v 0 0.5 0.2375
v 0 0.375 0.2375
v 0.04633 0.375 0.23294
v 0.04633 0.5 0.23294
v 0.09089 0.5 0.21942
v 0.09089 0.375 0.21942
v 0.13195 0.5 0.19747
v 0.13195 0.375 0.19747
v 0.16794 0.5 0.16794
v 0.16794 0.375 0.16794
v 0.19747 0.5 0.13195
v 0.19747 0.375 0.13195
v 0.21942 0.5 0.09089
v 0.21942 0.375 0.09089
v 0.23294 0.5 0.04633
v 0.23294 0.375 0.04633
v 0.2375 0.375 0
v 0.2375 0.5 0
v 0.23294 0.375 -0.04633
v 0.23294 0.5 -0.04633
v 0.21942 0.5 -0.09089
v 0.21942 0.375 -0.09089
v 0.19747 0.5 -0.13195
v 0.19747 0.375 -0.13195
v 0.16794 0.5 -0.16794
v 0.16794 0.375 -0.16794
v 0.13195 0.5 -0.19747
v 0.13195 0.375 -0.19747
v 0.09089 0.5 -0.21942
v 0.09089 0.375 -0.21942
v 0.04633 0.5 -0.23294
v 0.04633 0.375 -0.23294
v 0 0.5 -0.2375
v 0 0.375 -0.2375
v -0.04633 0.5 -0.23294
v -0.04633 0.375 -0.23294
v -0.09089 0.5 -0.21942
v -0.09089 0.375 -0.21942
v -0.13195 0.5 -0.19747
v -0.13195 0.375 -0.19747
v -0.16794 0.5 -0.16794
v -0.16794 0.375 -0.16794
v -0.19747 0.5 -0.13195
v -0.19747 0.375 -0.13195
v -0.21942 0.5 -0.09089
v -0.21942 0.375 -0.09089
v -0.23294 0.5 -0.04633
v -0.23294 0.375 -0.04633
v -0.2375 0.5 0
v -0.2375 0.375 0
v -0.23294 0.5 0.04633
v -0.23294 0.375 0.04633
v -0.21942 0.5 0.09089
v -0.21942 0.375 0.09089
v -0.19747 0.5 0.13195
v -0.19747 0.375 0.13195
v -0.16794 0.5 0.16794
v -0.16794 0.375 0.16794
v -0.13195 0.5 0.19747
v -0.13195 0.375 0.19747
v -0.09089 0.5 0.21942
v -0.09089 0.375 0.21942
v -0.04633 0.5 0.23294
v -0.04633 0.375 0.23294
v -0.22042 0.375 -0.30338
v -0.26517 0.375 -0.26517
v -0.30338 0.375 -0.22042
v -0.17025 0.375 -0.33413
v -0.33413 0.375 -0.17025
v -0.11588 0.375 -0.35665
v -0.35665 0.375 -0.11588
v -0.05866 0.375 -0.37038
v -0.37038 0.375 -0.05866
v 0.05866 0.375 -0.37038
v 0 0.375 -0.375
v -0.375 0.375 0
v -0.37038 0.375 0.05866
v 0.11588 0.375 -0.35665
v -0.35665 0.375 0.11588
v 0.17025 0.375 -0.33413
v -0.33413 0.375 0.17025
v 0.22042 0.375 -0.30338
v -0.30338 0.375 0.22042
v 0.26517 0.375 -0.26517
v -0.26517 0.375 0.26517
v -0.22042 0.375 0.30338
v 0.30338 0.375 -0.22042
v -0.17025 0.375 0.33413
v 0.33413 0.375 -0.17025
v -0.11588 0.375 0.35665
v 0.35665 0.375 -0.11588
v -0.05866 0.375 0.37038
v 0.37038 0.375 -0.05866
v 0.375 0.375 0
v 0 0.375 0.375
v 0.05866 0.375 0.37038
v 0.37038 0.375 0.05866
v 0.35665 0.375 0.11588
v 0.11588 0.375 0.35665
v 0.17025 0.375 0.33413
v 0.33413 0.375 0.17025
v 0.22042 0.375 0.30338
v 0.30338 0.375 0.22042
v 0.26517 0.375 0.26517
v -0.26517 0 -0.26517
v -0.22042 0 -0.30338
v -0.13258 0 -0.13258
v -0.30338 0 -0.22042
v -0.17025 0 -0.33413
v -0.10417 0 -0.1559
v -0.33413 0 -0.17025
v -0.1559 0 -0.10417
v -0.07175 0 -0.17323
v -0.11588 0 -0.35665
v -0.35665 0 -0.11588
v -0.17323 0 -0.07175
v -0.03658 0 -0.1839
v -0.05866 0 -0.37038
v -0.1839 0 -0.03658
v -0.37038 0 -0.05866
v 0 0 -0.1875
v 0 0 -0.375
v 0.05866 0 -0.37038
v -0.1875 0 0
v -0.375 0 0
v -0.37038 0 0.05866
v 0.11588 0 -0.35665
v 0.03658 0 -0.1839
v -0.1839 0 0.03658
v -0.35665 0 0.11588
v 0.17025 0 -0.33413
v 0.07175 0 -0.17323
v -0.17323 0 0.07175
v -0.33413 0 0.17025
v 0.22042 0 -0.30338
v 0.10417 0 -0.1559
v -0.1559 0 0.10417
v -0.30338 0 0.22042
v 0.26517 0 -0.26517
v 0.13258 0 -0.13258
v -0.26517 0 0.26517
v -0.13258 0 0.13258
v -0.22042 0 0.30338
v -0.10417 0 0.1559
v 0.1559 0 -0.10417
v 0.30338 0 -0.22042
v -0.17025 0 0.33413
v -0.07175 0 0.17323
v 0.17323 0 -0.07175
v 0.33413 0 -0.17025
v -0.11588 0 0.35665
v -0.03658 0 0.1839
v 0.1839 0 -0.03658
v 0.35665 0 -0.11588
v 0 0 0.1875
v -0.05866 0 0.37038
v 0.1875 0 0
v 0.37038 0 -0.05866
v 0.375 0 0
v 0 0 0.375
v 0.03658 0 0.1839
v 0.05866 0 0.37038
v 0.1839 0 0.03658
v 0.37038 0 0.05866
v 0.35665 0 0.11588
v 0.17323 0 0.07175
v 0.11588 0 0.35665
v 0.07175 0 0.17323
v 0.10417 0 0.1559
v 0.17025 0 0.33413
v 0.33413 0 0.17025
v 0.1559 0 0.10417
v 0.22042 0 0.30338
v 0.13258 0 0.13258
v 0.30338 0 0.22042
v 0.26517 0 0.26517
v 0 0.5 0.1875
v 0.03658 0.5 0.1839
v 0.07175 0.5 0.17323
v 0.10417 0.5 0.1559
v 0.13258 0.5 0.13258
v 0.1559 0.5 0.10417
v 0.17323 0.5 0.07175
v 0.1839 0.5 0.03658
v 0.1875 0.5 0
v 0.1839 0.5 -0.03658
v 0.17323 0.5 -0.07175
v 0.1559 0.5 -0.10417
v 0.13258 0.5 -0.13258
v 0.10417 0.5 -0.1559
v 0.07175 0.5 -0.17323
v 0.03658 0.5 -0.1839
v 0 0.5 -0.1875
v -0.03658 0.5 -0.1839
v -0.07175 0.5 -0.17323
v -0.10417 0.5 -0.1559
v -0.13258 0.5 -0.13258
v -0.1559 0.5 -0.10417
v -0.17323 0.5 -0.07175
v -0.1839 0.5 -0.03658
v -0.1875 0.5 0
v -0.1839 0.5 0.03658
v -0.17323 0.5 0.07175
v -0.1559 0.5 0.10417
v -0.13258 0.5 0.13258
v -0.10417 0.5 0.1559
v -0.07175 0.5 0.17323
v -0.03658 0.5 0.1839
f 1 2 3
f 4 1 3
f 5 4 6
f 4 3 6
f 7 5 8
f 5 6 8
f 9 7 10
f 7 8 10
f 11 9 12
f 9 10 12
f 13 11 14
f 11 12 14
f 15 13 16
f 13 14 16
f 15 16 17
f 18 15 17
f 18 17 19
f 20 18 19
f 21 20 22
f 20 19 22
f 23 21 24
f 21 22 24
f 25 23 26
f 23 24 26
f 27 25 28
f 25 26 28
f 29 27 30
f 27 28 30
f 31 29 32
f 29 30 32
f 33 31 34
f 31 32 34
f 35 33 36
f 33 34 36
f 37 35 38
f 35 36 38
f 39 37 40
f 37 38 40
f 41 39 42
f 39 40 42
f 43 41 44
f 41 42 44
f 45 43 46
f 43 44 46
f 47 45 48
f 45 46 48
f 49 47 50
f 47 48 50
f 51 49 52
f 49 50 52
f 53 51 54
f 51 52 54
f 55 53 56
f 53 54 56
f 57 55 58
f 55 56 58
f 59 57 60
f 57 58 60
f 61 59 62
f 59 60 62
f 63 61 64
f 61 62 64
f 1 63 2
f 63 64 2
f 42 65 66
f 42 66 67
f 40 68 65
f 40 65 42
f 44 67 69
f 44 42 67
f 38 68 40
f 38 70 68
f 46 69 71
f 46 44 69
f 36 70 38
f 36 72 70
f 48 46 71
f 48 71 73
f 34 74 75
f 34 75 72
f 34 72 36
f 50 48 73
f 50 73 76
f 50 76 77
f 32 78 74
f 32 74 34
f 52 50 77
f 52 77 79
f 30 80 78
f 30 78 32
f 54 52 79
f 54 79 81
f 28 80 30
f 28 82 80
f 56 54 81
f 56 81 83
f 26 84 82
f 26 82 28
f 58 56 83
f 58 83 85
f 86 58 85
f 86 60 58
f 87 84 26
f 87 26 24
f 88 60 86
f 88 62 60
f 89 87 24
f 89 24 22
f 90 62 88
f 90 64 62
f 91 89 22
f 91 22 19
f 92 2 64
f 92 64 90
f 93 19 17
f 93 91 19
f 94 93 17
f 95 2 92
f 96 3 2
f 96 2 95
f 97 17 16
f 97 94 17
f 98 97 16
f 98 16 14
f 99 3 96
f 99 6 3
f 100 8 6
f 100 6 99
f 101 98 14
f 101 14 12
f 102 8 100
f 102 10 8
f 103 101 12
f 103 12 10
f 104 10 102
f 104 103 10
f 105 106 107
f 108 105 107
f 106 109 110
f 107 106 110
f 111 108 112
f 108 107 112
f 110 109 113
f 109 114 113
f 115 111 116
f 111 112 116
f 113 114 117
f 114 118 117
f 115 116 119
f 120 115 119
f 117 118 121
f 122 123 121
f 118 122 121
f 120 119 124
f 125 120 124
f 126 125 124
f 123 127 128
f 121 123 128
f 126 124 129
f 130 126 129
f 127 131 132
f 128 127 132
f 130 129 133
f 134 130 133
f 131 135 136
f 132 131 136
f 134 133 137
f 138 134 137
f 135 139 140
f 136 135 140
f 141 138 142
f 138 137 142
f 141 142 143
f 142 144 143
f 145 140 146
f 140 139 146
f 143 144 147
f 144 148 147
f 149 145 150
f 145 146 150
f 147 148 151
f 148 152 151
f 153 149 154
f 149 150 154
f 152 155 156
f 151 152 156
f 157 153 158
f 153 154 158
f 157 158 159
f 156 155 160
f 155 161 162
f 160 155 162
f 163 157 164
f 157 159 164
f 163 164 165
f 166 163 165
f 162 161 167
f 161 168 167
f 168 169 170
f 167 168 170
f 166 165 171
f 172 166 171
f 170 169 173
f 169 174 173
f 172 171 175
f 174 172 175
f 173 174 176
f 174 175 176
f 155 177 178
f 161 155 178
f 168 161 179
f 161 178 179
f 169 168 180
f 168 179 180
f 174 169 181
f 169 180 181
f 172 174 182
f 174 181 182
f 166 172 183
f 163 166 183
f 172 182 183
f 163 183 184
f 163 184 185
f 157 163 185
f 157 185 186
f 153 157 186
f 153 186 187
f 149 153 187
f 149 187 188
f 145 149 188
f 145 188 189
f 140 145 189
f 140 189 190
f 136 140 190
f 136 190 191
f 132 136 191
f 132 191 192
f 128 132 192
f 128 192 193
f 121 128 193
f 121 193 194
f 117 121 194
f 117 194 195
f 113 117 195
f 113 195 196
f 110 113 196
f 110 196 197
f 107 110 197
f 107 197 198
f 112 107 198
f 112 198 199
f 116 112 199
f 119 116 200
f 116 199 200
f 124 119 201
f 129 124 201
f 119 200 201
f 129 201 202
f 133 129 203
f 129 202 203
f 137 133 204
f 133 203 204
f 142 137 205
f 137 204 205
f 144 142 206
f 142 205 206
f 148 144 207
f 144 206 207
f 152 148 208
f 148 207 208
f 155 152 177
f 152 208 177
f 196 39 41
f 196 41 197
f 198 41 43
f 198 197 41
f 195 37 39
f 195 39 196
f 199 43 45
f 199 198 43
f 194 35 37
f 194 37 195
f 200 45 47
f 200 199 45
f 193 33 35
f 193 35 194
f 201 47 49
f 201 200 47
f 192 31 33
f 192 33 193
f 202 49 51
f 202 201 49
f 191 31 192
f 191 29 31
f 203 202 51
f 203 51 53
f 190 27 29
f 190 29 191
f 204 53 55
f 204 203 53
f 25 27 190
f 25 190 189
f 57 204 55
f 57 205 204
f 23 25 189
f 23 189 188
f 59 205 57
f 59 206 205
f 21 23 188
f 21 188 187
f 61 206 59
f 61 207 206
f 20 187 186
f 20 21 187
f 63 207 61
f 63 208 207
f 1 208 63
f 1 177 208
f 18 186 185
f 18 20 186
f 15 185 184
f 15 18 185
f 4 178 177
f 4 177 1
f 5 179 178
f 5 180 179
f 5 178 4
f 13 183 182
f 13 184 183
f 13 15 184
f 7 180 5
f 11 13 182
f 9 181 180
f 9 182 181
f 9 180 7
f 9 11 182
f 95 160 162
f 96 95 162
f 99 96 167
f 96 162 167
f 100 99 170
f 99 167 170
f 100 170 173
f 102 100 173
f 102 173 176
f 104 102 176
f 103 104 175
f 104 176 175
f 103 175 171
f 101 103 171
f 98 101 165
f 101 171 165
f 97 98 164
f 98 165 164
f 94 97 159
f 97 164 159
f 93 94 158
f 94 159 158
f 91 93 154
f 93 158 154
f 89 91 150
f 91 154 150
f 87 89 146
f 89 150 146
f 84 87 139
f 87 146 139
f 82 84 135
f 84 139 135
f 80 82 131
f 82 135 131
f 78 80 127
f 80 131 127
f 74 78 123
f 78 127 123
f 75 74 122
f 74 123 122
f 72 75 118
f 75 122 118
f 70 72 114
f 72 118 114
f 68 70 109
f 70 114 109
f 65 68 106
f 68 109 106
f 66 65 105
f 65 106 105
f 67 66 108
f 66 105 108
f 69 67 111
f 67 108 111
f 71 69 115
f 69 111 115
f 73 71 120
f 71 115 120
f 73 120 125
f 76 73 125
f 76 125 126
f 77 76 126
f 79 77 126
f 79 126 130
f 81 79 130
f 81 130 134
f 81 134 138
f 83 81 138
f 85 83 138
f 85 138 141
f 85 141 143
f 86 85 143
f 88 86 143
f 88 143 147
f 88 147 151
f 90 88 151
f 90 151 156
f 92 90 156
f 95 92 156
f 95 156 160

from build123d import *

# Parameters (mm, degrees)
SKETCH1_R           = 0.375
BOSS_EXTRUDE2_DEPTH = 0.375
SKETCH3_R           = 0.1875
CUT_EXTRUDE1_DEPTH  = 0.375
SKETCH4_R           = 0.2375
BOSS_EXTRUDE3_DEPTH = 0.125
SKETCH5_R           = 0.1875
CUT_EXTRUDE2_DEPTH  = 0.125


with BuildPart() as part:
    # Sketch1 → Boss-Extrude2 (new body)
    with BuildSketch(Plane(origin=(0, 0, 0), x_dir=(1, 0, 0), z_dir=(0, 1, 0))):
        with Locations(Location((0, 0, 0), (0, 0, 270))):
            Circle(SKETCH1_R)
    extrude(amount=BOSS_EXTRUDE2_DEPTH)

    # Sketch3 → Cut-Extrude1 (cut)
    with BuildSketch(Plane(origin=(0, 0.375, 0), x_dir=(1, 0, 0), z_dir=(0, 1, 0))):
        with Locations(Location((0, 0, 0), (0, 0, 270))):
            Circle(SKETCH3_R)
    extrude(amount=-CUT_EXTRUDE1_DEPTH, mode=Mode.SUBTRACT)

    # Sketch4 → Boss-Extrude3 (add)
    with BuildSketch(Plane(origin=(0, 0.375, 0), x_dir=(1, 0, 0), z_dir=(0, 1, 0))):
        with Locations(Location((0, 0, 0), (0, 0, 270))):
            Circle(SKETCH4_R)
    extrude(amount=BOSS_EXTRUDE3_DEPTH)

    # Sketch5 → Cut-Extrude2 (cut)
    with BuildSketch(Plane(origin=(0, 0.5, 0), x_dir=(1, 0, 0), z_dir=(0, 1, 0))):
        with Locations(Location((0, 0, 0), (0, 0, 270))):
            Circle(SKETCH5_R)
    extrude(amount=-CUT_EXTRUDE2_DEPTH, mode=Mode.SUBTRACT)


solid = part.part
